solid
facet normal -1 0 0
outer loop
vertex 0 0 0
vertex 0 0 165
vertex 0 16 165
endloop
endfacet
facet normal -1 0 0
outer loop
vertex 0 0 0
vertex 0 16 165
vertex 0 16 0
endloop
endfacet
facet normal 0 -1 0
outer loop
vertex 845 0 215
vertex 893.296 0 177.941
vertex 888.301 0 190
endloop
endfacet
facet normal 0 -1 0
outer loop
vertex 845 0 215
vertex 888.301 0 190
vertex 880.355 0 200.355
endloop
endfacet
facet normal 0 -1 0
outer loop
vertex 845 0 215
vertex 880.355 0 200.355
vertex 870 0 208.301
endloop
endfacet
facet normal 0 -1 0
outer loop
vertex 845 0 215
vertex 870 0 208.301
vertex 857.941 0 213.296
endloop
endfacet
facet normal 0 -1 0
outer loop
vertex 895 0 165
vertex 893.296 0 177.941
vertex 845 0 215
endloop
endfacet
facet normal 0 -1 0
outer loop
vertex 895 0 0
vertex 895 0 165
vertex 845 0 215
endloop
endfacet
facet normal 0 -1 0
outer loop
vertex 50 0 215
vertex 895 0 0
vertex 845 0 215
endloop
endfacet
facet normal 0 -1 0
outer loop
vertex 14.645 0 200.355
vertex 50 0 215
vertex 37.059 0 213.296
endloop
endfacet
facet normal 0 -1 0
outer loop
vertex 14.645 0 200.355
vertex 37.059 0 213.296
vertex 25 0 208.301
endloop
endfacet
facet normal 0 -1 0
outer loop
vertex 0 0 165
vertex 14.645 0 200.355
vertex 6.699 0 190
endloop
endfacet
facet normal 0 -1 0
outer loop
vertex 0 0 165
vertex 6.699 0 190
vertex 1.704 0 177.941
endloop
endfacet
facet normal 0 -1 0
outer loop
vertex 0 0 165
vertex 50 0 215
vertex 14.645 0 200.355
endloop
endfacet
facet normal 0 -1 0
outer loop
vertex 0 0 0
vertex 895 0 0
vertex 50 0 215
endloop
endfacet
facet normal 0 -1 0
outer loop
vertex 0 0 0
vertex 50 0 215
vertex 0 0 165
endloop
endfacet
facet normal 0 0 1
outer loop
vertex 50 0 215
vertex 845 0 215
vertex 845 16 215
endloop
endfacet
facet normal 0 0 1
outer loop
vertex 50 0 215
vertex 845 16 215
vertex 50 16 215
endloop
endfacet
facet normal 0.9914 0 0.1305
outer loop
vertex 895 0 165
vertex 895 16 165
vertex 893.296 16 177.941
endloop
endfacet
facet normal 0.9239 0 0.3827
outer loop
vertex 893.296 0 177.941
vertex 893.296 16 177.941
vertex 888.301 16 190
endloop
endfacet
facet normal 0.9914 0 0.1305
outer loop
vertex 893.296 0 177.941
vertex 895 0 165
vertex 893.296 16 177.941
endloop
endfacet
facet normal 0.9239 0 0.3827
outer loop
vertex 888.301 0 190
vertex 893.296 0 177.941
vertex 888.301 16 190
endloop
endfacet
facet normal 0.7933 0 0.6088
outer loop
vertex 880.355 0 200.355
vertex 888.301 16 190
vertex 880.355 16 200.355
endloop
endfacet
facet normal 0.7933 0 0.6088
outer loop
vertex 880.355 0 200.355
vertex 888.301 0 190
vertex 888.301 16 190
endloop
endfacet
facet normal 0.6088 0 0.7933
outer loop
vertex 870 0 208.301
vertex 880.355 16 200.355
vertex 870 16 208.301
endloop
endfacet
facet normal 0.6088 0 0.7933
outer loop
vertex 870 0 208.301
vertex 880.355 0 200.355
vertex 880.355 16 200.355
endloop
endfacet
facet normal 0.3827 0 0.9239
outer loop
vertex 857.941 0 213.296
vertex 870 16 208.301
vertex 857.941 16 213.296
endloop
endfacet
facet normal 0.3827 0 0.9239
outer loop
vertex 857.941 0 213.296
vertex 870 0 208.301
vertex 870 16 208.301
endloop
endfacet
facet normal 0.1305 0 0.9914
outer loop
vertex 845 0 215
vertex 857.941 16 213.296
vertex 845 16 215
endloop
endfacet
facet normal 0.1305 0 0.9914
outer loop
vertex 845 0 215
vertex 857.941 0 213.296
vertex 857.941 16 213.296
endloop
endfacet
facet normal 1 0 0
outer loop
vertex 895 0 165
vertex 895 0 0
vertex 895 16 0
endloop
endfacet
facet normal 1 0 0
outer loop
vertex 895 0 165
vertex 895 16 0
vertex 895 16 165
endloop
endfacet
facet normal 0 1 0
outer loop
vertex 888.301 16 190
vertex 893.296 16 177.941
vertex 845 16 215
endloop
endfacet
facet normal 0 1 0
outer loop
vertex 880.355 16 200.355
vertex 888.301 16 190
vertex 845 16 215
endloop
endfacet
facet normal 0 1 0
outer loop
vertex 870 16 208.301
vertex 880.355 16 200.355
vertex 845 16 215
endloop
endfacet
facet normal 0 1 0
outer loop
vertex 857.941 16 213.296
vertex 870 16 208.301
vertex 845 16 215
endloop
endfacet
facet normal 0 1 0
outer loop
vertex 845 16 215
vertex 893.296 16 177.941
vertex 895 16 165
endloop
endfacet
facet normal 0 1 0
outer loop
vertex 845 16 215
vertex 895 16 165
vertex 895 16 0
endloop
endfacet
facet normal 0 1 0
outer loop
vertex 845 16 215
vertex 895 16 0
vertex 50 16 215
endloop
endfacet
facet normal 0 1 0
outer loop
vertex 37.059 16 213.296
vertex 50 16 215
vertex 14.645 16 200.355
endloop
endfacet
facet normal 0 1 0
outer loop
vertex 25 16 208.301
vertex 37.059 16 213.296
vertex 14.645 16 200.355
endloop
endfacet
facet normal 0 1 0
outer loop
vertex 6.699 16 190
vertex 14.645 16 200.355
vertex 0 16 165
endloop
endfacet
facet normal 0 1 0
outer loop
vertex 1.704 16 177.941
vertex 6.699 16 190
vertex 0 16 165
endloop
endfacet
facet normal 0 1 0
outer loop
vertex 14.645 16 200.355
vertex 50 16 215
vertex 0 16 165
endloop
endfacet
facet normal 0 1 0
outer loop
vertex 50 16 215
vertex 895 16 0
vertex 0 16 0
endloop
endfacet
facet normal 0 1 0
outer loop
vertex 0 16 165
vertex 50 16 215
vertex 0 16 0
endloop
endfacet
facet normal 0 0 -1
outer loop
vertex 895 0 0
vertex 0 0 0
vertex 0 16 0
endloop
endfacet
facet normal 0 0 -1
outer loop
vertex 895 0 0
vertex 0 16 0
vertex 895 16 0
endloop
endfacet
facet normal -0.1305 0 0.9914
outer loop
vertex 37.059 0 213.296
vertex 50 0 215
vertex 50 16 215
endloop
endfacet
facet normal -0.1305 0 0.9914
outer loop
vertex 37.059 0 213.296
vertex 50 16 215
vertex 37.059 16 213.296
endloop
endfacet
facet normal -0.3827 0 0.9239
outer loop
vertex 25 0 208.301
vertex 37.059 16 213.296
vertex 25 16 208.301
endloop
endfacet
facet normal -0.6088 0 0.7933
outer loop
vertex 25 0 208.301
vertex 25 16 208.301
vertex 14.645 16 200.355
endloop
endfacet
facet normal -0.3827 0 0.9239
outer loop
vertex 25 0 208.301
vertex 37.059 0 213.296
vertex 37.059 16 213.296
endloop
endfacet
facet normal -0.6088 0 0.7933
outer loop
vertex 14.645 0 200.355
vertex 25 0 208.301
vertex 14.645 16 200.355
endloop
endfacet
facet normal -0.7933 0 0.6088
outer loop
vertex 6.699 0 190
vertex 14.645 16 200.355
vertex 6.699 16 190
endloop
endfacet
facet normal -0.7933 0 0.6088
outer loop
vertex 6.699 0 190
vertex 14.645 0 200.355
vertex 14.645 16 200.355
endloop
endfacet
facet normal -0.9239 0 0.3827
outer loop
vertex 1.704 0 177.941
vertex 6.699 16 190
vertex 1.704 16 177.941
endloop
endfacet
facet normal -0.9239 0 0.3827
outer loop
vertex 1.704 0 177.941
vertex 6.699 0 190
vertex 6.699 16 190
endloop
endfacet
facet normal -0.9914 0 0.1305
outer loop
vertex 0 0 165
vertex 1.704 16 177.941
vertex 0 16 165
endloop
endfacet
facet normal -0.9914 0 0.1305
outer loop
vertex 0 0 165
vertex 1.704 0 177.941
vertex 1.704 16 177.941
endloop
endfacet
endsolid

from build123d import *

# Parameters (mm, degrees)
EXTRUDE_1_DEPTH = 16


with BuildPart() as part:
    # Эскиз1 → Бобышка-Вытянуть1 (new body)
    with BuildSketch(Plane(origin=(0, 0, 0), x_dir=(1, 0, 0), z_dir=(0, 1, 0))):
        with BuildLine():
            Line((0, 0), (895, 0))
            Line((895, 0), (895, -165))
            ThreePointArc((895, -165), (880.355339059, -200.355339059), (845, -215))
            Line((845, -215), (50, -215))
            ThreePointArc((50, -215), (14.644660941, -200.355339059), (0, -165))
            Line((0, -165), (0, 0))
        make_face()
    extrude(amount=EXTRUDE_1_DEPTH)


solid = part.part
